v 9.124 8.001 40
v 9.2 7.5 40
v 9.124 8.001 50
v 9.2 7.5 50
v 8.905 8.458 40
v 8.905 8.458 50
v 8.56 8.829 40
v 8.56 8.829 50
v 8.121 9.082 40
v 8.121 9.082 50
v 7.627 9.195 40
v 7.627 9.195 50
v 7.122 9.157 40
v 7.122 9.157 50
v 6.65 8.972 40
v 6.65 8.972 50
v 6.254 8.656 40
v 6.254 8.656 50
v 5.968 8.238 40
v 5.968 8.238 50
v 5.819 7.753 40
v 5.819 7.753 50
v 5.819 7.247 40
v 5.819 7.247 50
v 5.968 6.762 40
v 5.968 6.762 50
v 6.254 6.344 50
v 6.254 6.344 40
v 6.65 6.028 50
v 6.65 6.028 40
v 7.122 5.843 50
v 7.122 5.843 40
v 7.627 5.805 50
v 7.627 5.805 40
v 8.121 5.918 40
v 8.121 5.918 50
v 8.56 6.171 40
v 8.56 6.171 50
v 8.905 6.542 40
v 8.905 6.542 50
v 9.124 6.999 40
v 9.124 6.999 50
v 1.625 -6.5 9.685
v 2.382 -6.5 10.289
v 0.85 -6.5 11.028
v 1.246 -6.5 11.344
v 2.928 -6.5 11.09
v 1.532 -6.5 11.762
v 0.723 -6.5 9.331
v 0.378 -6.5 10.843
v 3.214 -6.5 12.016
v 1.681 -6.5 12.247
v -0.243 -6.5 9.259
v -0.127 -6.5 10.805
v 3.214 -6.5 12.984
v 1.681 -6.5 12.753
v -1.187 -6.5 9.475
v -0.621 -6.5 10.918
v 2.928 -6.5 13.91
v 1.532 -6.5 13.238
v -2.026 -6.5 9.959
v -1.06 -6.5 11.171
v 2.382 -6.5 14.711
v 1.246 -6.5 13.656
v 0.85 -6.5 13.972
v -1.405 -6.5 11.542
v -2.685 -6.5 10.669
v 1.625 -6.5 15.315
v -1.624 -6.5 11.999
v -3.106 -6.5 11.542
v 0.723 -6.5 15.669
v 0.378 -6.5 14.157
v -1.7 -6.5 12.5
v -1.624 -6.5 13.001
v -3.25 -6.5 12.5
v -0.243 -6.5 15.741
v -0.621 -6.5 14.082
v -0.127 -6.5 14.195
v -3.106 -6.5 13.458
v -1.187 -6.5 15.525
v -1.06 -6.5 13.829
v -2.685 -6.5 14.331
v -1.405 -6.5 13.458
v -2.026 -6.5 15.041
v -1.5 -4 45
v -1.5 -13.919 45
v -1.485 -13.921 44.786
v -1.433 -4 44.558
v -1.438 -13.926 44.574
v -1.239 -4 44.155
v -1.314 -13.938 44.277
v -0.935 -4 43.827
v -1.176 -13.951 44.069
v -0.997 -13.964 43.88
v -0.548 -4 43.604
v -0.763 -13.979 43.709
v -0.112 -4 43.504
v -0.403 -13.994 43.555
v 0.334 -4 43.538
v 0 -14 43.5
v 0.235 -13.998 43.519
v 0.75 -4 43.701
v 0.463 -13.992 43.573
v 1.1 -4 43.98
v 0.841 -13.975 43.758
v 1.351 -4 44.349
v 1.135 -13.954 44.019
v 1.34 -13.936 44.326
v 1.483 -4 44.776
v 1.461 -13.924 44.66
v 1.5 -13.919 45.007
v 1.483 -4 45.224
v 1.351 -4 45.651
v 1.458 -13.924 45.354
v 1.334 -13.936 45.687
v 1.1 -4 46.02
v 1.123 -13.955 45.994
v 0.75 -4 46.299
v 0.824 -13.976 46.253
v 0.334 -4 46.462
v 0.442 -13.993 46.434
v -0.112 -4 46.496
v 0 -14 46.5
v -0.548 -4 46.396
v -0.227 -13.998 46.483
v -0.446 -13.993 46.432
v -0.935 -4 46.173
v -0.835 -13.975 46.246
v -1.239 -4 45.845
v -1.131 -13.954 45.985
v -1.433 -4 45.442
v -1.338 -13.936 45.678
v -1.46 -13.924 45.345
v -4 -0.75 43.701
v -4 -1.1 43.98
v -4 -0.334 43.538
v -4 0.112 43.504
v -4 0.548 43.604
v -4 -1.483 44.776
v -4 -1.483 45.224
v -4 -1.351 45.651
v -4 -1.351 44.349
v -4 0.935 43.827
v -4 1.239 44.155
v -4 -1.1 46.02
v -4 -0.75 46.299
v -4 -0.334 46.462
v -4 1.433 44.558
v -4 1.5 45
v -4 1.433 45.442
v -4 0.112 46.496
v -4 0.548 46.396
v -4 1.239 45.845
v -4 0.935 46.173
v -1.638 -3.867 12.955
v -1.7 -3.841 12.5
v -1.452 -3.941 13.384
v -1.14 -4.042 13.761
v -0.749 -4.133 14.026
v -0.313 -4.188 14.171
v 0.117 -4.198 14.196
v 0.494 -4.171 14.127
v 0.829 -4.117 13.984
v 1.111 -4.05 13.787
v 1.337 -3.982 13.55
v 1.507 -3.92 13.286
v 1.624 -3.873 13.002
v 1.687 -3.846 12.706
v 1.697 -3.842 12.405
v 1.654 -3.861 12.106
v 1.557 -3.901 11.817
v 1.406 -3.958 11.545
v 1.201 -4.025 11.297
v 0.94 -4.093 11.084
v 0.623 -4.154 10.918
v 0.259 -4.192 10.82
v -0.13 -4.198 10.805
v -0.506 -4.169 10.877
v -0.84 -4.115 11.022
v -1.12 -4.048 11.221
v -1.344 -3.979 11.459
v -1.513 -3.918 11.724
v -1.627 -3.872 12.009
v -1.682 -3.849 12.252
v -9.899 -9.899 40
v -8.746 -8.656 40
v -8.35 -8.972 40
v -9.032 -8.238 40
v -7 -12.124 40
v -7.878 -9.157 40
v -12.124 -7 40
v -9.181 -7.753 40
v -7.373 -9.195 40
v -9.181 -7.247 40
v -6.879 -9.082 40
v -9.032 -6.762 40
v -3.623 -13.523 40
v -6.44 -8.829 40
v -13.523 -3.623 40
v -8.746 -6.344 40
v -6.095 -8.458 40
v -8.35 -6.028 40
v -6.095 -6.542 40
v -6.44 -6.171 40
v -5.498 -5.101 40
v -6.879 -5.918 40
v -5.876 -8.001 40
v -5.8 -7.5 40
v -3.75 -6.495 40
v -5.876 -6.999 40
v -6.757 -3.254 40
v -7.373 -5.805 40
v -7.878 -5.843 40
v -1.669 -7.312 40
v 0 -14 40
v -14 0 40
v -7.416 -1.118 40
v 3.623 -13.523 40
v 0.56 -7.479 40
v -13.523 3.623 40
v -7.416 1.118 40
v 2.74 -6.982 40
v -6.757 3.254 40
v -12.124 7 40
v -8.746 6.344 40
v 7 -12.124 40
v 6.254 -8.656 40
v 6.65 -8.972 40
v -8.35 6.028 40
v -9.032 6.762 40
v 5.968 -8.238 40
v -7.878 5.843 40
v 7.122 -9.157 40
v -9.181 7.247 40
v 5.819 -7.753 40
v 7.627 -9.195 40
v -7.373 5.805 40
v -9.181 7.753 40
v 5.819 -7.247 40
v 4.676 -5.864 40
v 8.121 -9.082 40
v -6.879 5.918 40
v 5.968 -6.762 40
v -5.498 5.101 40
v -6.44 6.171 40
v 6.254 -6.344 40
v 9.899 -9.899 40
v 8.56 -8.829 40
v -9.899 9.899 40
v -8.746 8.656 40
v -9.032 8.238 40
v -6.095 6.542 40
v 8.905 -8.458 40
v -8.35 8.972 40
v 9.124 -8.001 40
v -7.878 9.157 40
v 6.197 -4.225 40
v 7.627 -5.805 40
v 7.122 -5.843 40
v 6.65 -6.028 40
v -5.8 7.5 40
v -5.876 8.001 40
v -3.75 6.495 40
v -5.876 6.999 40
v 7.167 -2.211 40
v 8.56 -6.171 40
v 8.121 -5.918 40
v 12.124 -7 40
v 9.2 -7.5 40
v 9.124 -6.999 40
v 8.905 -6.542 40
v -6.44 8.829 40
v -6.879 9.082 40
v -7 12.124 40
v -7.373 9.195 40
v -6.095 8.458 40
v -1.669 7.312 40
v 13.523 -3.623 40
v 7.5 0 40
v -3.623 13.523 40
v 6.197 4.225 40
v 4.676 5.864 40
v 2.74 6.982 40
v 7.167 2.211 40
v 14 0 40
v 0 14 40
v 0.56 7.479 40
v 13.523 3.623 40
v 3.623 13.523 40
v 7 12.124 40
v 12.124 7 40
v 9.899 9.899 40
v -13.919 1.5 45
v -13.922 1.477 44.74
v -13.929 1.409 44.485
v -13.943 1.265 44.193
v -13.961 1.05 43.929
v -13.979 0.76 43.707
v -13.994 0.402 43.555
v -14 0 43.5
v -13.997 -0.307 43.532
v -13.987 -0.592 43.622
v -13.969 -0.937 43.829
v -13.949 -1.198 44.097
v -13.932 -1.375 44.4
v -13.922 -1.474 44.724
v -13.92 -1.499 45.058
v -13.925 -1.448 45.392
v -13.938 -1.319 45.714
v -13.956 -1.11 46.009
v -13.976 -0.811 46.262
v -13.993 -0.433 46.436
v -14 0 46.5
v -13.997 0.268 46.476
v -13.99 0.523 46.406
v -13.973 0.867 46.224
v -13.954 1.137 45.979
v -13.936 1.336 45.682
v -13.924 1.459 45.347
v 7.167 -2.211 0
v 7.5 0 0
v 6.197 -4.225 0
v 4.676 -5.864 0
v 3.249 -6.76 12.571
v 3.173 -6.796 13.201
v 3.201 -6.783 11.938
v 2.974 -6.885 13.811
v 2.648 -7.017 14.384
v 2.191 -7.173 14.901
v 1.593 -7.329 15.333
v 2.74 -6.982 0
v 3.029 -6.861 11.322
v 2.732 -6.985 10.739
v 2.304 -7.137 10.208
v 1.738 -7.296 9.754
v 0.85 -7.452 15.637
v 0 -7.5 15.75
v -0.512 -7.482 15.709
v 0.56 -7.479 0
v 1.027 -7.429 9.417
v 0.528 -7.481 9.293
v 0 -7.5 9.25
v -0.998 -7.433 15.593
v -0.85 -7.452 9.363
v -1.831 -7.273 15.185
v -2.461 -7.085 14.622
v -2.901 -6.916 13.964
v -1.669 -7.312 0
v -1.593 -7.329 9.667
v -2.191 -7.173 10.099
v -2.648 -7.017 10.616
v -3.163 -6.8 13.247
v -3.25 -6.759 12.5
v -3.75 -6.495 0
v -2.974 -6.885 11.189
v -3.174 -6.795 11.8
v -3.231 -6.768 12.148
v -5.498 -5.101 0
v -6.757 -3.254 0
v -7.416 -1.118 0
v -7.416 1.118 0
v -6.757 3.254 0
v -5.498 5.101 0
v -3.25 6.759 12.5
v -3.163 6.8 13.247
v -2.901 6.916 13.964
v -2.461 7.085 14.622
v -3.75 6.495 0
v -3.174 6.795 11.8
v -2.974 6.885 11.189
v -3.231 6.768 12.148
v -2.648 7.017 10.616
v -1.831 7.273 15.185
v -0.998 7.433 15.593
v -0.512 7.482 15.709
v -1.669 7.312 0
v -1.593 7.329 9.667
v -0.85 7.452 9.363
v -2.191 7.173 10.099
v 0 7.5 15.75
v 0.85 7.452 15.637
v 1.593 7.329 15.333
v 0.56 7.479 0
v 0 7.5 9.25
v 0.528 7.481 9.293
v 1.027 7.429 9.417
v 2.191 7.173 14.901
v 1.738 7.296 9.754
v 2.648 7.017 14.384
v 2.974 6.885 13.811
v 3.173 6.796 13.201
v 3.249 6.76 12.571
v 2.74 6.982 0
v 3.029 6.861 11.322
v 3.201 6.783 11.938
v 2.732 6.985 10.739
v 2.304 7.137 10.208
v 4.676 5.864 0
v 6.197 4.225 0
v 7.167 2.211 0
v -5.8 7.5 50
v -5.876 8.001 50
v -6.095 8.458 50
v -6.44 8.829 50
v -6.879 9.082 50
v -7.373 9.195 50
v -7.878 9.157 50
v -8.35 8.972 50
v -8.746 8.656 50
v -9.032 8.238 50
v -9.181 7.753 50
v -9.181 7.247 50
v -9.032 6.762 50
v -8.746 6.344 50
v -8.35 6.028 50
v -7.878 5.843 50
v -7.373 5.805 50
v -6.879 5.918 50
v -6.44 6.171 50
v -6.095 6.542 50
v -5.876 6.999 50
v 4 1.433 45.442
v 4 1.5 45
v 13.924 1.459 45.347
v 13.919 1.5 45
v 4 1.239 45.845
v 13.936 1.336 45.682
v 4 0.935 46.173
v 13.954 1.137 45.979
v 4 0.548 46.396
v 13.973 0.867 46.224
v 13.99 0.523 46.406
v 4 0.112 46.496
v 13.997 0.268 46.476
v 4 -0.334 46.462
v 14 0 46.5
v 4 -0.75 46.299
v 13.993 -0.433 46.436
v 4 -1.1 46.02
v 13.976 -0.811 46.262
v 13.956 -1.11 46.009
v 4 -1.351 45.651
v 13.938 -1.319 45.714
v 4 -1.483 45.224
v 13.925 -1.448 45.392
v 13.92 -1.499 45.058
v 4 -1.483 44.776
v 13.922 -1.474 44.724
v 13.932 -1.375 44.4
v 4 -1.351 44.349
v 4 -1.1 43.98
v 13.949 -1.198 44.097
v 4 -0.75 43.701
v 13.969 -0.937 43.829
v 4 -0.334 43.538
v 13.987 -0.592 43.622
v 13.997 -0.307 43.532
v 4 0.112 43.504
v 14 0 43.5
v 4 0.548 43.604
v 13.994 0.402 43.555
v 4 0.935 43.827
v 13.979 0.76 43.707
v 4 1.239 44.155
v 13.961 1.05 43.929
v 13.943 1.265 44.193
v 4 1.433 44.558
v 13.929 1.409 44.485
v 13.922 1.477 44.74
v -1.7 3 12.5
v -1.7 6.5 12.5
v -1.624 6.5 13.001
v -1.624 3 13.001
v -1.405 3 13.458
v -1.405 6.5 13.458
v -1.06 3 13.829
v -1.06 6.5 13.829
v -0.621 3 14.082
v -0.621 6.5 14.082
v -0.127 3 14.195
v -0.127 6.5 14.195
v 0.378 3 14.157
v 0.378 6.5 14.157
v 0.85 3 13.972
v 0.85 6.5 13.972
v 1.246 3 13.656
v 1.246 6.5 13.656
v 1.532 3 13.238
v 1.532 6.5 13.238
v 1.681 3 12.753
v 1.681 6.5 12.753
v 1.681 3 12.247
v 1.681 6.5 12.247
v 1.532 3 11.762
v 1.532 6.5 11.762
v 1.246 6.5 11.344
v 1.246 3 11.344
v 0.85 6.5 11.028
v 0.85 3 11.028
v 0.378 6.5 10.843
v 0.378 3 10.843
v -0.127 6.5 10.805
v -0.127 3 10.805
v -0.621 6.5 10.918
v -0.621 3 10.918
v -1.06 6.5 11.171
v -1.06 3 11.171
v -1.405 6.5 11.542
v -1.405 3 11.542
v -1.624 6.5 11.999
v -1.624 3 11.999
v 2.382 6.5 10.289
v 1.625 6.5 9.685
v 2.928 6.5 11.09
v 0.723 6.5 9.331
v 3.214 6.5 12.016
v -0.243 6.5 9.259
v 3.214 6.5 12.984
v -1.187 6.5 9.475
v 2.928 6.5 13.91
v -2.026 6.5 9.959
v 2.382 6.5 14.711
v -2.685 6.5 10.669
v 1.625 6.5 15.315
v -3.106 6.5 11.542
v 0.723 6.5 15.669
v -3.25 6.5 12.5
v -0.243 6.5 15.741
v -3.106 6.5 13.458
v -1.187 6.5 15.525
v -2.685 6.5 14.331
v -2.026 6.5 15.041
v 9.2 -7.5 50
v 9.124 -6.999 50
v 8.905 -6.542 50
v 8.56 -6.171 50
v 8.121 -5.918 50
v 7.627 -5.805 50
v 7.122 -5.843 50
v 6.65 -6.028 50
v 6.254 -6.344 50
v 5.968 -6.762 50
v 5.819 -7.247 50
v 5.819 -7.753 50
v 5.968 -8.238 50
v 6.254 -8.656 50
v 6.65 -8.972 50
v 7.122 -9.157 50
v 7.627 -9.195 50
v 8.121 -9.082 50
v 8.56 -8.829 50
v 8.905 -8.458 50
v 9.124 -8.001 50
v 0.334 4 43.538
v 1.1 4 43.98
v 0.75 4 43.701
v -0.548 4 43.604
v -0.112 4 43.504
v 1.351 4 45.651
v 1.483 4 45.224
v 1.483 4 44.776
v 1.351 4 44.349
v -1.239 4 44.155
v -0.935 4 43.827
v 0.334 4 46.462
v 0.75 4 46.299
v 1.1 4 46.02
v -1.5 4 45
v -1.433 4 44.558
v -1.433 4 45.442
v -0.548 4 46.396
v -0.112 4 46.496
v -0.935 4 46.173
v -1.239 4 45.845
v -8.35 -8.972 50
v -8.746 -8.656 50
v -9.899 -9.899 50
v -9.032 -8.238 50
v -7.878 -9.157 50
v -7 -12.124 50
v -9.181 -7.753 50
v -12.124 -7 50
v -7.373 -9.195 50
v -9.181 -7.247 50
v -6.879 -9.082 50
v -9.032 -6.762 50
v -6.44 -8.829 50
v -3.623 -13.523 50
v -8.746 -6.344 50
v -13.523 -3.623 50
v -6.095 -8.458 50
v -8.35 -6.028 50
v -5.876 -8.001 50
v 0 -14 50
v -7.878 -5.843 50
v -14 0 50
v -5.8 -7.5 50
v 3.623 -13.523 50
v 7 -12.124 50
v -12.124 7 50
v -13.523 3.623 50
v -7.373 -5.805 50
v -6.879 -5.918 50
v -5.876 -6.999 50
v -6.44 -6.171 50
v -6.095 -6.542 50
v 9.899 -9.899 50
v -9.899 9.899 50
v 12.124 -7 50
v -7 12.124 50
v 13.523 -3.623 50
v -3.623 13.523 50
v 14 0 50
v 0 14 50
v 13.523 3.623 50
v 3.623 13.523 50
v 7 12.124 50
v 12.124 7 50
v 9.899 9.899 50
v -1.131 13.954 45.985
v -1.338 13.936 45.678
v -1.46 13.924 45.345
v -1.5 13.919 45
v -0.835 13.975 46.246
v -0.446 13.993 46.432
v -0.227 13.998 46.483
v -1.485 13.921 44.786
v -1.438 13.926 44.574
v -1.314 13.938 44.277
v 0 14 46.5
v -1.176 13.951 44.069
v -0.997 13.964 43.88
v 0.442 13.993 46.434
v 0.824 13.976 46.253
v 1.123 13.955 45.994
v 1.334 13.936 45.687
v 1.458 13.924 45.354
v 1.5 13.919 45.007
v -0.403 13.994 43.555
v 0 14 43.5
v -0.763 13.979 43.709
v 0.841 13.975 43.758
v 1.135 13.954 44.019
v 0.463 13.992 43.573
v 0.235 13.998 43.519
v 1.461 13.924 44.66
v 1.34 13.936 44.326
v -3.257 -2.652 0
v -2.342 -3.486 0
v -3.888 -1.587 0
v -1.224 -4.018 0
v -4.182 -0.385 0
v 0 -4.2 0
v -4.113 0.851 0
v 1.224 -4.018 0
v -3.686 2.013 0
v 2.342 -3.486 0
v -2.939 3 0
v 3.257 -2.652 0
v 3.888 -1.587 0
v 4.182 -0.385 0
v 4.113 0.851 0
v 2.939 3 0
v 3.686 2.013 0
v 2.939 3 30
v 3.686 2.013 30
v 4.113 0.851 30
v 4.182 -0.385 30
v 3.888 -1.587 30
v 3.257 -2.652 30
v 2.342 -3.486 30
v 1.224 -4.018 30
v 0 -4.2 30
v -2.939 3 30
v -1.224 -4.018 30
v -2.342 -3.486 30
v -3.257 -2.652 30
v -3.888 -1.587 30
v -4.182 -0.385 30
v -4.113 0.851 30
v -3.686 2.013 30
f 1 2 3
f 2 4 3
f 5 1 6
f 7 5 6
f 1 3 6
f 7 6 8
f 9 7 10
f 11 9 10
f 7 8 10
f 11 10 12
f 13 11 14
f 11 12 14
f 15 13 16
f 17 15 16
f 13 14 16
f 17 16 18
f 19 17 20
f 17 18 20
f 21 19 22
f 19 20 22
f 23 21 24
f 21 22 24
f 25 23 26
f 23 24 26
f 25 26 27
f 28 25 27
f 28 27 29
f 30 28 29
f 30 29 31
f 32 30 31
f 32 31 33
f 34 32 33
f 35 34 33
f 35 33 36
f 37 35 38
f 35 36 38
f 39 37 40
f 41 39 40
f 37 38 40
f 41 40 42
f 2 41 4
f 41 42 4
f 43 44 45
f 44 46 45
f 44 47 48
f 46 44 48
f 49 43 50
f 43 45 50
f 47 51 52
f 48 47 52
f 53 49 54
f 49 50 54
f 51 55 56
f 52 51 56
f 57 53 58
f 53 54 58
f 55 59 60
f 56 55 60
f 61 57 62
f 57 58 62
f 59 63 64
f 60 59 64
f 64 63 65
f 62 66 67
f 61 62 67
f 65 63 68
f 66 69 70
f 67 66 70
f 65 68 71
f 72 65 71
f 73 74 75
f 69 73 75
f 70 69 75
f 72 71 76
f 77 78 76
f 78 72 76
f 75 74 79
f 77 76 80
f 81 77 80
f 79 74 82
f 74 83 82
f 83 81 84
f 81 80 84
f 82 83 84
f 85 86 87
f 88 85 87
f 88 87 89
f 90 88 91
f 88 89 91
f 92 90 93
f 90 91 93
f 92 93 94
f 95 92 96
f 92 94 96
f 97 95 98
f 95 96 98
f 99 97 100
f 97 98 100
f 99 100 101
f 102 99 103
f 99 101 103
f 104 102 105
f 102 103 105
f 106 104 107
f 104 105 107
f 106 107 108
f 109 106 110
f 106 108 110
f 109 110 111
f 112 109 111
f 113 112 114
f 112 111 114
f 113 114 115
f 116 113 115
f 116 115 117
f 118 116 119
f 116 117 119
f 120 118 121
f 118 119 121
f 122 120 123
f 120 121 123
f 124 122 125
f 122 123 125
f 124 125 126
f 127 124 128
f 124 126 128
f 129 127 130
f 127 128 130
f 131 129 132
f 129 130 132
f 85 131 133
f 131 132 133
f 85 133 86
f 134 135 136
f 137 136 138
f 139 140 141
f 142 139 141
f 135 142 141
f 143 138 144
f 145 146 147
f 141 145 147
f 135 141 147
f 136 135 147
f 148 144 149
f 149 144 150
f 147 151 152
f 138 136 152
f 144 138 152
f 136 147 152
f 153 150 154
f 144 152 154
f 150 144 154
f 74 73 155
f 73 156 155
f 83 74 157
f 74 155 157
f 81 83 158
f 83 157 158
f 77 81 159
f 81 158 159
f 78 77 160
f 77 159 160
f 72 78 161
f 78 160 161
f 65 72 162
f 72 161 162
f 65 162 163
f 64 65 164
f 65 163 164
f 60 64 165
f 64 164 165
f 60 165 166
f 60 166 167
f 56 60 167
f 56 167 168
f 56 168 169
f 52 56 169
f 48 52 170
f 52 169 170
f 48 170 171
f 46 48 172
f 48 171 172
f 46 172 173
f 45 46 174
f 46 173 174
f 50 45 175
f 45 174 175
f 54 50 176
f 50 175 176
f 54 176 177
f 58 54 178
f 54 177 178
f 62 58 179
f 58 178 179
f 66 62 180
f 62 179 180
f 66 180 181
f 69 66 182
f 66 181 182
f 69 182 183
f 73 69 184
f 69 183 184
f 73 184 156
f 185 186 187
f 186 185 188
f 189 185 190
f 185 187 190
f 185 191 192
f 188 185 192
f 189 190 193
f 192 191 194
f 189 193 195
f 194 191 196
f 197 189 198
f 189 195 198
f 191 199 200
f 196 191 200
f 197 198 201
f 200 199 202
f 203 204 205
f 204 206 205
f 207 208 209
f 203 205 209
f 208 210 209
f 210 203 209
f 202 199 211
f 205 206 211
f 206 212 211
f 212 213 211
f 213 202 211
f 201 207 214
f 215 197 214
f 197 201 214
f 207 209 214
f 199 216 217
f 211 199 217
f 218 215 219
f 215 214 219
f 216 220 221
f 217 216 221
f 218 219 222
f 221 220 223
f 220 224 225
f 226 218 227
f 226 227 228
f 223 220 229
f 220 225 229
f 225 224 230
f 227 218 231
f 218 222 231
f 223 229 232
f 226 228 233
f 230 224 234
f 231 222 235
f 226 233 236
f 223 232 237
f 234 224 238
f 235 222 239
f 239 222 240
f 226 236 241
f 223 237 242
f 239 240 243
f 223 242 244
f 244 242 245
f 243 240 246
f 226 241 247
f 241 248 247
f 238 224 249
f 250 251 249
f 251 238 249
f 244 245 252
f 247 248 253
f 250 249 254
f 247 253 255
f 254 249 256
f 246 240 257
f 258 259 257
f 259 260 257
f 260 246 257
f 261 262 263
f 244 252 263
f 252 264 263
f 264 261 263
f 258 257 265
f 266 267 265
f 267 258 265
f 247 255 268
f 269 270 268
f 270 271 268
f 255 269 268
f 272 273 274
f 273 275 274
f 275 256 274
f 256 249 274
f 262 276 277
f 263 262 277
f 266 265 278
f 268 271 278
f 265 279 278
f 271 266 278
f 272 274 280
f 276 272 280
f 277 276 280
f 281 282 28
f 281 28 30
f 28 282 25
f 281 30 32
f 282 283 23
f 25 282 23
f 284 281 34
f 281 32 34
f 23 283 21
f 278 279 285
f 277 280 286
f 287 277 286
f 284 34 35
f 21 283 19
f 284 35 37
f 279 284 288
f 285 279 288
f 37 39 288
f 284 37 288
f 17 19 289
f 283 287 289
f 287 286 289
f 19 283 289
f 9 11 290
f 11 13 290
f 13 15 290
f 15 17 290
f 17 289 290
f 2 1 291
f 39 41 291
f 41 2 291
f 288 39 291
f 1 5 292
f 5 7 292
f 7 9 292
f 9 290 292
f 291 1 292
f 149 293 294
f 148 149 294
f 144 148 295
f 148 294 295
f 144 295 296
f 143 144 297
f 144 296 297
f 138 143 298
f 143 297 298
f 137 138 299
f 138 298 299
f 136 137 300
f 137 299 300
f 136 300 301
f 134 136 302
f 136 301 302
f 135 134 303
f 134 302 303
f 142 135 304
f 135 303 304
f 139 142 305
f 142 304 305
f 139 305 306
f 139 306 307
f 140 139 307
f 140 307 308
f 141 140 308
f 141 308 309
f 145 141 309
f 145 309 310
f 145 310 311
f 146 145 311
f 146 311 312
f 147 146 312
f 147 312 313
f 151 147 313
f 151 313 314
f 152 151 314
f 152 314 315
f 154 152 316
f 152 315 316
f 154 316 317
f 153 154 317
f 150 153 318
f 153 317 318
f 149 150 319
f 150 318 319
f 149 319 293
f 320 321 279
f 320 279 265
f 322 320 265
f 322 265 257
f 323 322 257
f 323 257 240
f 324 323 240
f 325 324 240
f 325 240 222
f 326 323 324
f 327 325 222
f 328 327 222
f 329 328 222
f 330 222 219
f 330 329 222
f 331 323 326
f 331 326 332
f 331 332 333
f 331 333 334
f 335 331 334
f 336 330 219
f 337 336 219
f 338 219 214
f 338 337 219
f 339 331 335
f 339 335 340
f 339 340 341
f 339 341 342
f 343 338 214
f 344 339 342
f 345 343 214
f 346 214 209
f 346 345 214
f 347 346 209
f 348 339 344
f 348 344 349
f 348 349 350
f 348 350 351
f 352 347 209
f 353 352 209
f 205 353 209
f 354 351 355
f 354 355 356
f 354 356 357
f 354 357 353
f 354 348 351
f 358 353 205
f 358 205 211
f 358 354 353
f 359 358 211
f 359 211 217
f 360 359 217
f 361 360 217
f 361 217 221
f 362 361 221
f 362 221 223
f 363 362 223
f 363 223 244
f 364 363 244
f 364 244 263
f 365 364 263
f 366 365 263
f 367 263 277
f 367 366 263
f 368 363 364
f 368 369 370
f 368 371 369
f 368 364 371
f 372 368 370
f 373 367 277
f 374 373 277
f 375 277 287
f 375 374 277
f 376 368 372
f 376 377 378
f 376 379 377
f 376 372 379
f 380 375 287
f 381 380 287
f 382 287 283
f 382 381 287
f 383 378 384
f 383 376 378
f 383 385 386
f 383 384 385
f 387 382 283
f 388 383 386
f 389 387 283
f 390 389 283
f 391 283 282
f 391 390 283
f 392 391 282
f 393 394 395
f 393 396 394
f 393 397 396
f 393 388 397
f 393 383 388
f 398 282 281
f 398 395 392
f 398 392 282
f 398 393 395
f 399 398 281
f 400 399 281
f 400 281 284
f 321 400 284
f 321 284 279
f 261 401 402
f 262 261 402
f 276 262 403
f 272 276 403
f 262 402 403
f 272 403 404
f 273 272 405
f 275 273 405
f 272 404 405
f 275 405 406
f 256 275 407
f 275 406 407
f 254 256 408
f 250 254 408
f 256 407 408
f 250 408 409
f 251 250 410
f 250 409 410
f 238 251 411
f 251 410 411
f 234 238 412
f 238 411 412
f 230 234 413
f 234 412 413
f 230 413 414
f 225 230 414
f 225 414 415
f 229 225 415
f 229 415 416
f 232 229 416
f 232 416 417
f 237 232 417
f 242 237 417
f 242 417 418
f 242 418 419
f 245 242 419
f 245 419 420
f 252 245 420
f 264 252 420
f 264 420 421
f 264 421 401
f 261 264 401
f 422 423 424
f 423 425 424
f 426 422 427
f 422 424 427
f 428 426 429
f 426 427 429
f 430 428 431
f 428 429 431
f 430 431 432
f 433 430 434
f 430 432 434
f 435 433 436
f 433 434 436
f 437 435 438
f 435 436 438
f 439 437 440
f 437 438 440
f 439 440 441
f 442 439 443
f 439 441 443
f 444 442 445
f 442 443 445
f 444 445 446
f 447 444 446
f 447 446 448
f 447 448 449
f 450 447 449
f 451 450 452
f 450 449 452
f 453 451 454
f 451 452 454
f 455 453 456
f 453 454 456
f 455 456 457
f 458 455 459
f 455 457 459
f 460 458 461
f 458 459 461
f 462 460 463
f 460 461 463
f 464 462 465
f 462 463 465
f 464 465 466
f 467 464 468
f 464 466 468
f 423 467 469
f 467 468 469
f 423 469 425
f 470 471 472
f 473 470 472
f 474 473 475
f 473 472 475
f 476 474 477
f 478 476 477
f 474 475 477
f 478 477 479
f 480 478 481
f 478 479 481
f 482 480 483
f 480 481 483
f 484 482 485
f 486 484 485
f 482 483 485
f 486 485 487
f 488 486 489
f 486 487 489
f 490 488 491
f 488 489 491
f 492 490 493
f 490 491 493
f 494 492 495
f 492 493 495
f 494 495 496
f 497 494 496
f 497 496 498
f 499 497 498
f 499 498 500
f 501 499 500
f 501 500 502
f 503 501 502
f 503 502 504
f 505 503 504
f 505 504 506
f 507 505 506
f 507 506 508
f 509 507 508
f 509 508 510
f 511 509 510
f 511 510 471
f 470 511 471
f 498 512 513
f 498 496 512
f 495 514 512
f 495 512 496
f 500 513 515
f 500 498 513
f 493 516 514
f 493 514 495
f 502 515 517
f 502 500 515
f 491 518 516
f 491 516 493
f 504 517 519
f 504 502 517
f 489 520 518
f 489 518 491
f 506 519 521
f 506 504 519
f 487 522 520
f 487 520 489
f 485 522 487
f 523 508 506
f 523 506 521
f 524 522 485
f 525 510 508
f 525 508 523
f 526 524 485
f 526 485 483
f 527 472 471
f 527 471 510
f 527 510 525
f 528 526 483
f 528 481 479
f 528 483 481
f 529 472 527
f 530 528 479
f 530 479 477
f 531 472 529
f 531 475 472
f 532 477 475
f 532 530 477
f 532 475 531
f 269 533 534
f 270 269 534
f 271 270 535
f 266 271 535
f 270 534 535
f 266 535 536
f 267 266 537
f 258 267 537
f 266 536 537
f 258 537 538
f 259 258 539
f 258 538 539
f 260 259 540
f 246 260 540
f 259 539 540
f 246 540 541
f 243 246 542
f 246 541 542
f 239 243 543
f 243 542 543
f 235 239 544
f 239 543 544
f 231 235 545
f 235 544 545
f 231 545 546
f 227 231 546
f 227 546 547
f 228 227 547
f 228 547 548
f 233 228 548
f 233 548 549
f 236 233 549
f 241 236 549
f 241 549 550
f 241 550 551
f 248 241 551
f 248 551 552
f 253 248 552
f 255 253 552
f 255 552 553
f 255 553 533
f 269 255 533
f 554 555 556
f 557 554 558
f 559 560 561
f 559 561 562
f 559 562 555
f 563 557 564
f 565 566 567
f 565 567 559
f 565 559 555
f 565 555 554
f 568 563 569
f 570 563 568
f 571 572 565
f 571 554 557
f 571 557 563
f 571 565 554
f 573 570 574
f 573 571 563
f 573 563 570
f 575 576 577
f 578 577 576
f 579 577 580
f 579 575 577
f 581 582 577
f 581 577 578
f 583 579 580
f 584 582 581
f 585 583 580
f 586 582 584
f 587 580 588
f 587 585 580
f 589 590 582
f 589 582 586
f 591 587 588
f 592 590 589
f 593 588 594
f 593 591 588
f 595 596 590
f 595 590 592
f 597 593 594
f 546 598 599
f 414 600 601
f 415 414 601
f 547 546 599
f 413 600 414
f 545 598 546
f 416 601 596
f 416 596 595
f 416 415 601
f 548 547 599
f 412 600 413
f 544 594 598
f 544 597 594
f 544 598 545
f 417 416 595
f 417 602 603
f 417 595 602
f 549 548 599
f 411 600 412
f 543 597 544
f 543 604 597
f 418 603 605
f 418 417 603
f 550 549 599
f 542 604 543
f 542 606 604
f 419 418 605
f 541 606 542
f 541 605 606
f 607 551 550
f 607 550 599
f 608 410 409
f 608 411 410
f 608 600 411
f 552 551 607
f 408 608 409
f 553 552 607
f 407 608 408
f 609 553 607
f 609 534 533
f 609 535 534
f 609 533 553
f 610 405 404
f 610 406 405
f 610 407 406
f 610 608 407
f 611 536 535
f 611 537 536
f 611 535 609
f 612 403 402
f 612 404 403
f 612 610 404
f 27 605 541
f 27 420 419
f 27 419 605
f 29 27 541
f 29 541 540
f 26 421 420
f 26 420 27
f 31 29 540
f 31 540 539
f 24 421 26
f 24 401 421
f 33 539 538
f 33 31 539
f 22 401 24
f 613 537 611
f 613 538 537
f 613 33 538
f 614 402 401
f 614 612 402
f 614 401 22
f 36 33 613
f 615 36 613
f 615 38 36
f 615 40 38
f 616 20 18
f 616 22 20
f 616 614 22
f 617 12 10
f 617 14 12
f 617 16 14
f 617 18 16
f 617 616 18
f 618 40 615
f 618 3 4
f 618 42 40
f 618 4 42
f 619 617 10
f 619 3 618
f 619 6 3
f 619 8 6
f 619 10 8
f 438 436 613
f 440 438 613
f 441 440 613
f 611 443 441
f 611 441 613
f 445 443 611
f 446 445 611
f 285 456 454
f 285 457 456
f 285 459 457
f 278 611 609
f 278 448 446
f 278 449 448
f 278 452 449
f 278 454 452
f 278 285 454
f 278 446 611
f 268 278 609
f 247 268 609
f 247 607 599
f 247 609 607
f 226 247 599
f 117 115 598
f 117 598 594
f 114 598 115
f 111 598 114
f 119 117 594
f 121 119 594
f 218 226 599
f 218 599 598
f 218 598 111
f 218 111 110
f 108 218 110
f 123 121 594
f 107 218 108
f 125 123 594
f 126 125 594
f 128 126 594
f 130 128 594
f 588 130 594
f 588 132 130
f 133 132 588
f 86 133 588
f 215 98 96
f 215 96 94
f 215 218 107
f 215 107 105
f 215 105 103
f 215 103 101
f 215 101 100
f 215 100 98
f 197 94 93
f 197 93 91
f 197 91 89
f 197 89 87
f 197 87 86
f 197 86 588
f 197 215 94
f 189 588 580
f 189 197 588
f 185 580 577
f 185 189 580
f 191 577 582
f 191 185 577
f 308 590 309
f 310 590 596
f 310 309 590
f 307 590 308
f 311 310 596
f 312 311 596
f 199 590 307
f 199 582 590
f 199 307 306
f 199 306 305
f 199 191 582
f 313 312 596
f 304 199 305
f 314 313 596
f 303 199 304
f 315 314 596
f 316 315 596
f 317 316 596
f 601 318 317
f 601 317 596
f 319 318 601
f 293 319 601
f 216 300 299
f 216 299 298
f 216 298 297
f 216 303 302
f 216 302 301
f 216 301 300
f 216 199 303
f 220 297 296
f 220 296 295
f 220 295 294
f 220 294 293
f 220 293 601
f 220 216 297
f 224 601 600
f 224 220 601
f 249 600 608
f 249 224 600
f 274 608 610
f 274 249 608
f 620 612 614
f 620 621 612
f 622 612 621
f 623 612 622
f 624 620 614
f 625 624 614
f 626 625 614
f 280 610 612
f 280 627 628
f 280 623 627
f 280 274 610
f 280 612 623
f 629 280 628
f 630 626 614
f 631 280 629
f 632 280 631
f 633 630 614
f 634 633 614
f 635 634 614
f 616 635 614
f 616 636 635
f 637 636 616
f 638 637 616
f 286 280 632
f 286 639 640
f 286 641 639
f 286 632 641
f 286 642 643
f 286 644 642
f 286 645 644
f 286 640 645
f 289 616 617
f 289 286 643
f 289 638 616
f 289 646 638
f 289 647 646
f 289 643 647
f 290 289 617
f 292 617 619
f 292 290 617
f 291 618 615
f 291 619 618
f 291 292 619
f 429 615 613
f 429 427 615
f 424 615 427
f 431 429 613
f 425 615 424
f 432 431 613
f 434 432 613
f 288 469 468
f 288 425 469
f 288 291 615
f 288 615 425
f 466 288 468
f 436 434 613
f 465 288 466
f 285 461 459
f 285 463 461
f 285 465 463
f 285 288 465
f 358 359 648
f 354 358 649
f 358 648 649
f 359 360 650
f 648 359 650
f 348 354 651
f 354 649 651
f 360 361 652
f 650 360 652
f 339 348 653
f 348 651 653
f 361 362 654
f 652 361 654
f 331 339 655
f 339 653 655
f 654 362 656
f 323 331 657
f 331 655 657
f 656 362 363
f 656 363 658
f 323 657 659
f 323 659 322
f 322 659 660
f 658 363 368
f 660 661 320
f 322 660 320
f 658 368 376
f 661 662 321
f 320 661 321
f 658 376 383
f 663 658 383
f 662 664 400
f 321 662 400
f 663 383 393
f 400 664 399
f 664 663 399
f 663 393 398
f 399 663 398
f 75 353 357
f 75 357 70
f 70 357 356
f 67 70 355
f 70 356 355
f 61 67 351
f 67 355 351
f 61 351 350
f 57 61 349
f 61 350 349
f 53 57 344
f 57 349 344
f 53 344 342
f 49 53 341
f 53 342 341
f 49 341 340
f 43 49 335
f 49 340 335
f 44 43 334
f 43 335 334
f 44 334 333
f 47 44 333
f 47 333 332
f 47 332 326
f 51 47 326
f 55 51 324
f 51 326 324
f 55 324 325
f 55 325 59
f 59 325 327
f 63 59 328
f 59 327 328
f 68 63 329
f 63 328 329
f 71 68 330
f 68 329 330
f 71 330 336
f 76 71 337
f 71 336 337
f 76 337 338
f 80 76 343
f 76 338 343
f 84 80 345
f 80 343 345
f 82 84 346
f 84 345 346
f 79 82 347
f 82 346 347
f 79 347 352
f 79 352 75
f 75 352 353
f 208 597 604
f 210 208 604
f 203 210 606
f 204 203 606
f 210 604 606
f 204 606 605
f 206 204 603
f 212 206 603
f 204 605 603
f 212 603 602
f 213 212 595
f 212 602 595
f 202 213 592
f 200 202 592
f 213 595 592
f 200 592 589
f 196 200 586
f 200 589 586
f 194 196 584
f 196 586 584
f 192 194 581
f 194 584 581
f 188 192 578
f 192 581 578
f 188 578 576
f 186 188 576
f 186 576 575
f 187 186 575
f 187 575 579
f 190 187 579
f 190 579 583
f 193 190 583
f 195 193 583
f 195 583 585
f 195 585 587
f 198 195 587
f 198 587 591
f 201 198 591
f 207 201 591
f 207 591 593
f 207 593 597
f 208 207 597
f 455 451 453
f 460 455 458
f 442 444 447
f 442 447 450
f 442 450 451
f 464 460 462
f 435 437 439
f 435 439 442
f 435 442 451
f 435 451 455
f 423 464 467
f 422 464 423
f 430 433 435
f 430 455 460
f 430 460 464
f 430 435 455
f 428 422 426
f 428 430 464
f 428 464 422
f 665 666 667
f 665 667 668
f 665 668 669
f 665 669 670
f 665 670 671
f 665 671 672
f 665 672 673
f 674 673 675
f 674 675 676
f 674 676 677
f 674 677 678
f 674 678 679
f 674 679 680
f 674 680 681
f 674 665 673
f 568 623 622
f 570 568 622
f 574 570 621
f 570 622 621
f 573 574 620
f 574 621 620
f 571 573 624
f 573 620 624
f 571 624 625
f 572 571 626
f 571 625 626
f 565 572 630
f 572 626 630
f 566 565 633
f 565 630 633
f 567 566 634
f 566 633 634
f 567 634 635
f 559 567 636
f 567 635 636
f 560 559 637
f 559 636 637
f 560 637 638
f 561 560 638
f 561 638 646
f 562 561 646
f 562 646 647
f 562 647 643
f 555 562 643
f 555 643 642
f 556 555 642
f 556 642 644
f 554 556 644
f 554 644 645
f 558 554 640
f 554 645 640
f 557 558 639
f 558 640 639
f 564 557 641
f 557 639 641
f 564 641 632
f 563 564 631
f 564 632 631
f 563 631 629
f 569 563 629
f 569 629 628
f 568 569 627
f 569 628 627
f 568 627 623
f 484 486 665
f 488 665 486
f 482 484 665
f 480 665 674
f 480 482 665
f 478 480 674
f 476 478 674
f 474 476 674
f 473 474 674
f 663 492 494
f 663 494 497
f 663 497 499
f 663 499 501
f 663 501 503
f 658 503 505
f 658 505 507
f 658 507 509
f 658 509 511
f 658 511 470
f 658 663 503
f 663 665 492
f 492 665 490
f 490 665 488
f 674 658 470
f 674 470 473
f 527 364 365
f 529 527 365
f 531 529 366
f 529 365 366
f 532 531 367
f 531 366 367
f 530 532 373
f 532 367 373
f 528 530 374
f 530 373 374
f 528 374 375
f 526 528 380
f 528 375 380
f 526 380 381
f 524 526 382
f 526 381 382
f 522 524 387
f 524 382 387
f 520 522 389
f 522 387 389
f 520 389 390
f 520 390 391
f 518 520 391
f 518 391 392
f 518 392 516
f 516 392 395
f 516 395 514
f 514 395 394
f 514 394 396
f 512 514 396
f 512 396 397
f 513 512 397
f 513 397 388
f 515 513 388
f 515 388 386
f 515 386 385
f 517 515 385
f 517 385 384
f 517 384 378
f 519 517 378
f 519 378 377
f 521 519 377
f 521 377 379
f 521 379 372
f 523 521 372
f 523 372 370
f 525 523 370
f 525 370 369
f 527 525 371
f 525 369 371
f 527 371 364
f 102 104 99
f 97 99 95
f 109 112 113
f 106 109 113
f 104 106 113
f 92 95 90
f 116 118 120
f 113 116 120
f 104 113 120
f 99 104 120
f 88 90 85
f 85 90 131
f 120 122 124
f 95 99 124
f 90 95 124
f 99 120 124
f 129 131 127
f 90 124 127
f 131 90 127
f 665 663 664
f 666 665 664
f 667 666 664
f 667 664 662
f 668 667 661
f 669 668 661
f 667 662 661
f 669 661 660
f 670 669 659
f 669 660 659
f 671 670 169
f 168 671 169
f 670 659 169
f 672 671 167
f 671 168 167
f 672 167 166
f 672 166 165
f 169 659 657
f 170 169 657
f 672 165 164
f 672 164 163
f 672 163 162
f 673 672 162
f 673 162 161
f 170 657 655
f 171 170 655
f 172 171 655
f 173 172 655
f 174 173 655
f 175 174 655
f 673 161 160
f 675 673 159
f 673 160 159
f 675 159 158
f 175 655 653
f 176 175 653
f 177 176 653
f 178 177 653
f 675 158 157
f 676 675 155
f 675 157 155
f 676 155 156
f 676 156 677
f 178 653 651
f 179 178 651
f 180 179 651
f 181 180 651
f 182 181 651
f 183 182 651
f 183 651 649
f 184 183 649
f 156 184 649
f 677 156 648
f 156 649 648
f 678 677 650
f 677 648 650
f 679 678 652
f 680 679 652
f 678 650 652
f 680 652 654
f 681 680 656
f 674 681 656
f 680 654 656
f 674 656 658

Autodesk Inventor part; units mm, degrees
sketch "スケッチ1" plane through (0, 0, 0) normal (0, 0, 1) x (1, 0, 0)
  circle A0 centre (0, 0) radius 7.5
  dimension "d0" = 15
extrude "押し出し1" add sketch "スケッチ1" along normal blind 40
sketch "スケッチ2" plane through (0, 0, 0) normal (0, 0, -1) x (-1, 0, 0)
  arc A0 (-2.9394, 3) -> (2.9394, 3) centre (0, 0) ccw
  line L0 (-2.9394, 3) -> (2.9394, 3)
  point P0 (-3.1305, 2.8)
  dimension "d3" = 4.2
  dimension "d4" = 3
extrude "押し出し2" cut sketch "スケッチ2" against normal blind 30
ref_plane "作業平面1" through (14, 0, 0) normal (1, 0, 0) x (0, 1, 0)
ref_plane "作業平面2" through (-14, 0, 0) normal (1, 0, 0) x (0, 1, 0)
ref_plane "作業平面3" through (0, 7.5, 0) normal (0, 1, 0) x (-1, 0, 0)
ref_plane "作業平面4" through (0, -7.5, 0) normal (0, 1, 0) x (-1, 0, 0)
sketch "スケッチ7" plane through (0, 7.5, 0) normal (0, 1, 0) x (-1, 0, 0)
  circle A0 centre (0, 12.5) radius 1.7
  point P0 (0, 0)
  dimension "d35" = 3.4
  dimension "d36" = 12.5
extrude "押し出し7" cut sketch "スケッチ7" against normal through all
sketch "スケッチ8" plane through (0, 7.5, 0) normal (0, 1, 0) x (-1, 0, 0)
  circle A0 centre (0, 12.5) radius 3.25
  point P0 (0, 0)
  dimension "d39" = 6.5
  dimension "d40" = 12.5
sketch "スケッチ9" plane through (0, -7.5, 0) normal (0, 1, 0) x (-1, 0, 0)
  circle A0 centre (0, 12.5) radius 3.25
  point P0 (0, 0)
  dimension "d41" = 6.5
  dimension "d42" = 12.5
extrude "押し出し8" cut sketch "スケッチ8" against normal blind 1
extrude "押し出し9" cut sketch "スケッチ9" along normal blind 1
sketch "スケッチ10" plane through (0, 0, 40) normal (0, 0, 1) x (1, 0, 0)
  circle A0 centre (0, 0) radius 14
  dimension "d47" = 28
extrude "押し出し10" add sketch "スケッチ10" along normal blind 10
ref_plane "作業平面5" through (0, 14, 0) normal (0, 1, 0) x (-1, 0, 0)
ref_plane "作業平面6" through (0, -14, 0) normal (0, 1, 0) x (-1, 0, 0)
sketch "スケッチ11" plane through (0, 14, 0) normal (0, 1, 0) x (-1, 0, 0)
  circle A0 centre (0, 45) radius 1.5
  line L0 (14, 50) -> (-14, 50) projected
  point P0 (0, 0)
  dimension "d52" = 3
  dimension "d53" = 5
sketch "スケッチ12" plane through (0, -14, 0) normal (0, 1, 0) x (-1, 0, 0)
  circle A0 centre (0, 45) radius 1.5
  line L0 (14, 50) -> (-14, 50) projected
  point P0 (0, 0)
  dimension "d54" = 3
  dimension "d55" = 5
sketch "スケッチ13" plane through (-14, 0, 0) normal (1, 0, 0) x (0, 1, 0)
  circle A0 centre (0, 45) radius 1.5
  line L0 (14, 50) -> (-14, 50) projected
  point P0 (0, 0)
  dimension "d56" = 3
  dimension "d57" = 5
sketch "スケッチ14" plane through (14, 0, 0) normal (1, 0, 0) x (0, 1, 0)
  circle A0 centre (0, 45) radius 1.5
  line L0 (14, 50) -> (-14, 50) projected
  point P0 (0, 0)
  dimension "d58" = 3
  dimension "d59" = 5
extrude "押し出し11" cut sketch "スケッチ11" against normal blind 10
extrude "押し出し12" cut sketch "スケッチ12" along normal blind 10
extrude "押し出し13" cut sketch "スケッチ14" against normal blind 10
extrude "押し出し14" cut sketch "スケッチ13" along normal blind 10
thread "ねじ5" size "M3x0.5" class "6H" standard "ANSI Metric M Profile" full length
thread "ねじ6" size "M3x0.5" class "6H" standard "ANSI Metric M Profile" full length
thread "ねじ7" size "M3x0.5" class "6H" standard "ANSI Metric M Profile" full length
thread "ねじ8" size "M3x0.5" class "6H" standard "ANSI Metric M Profile" full length
sketch "スケッチ15" plane through (0, 0, 50) normal (0, 0, 1) x (1, 0, 0)
  circle A0 centre (7.5, 7.5) radius 1.7
  circle A1 centre (-7.5, 7.5) radius 1.7
  circle A2 centre (-7.5, -7.5) radius 1.7
  circle A3 centre (7.5, -7.5) radius 1.7
  point P0 (0, 0)
  dimension "d76" = 3.4
  dimension "d77" = 7.5
  dimension "d78" = 7.5
  dimension "d81" = 360
extrude "押し出し15" cut sketch "スケッチ15" against normal through all
properties part number "rotary_transfer_shaft_5_1" material "ステンレス鋼"
